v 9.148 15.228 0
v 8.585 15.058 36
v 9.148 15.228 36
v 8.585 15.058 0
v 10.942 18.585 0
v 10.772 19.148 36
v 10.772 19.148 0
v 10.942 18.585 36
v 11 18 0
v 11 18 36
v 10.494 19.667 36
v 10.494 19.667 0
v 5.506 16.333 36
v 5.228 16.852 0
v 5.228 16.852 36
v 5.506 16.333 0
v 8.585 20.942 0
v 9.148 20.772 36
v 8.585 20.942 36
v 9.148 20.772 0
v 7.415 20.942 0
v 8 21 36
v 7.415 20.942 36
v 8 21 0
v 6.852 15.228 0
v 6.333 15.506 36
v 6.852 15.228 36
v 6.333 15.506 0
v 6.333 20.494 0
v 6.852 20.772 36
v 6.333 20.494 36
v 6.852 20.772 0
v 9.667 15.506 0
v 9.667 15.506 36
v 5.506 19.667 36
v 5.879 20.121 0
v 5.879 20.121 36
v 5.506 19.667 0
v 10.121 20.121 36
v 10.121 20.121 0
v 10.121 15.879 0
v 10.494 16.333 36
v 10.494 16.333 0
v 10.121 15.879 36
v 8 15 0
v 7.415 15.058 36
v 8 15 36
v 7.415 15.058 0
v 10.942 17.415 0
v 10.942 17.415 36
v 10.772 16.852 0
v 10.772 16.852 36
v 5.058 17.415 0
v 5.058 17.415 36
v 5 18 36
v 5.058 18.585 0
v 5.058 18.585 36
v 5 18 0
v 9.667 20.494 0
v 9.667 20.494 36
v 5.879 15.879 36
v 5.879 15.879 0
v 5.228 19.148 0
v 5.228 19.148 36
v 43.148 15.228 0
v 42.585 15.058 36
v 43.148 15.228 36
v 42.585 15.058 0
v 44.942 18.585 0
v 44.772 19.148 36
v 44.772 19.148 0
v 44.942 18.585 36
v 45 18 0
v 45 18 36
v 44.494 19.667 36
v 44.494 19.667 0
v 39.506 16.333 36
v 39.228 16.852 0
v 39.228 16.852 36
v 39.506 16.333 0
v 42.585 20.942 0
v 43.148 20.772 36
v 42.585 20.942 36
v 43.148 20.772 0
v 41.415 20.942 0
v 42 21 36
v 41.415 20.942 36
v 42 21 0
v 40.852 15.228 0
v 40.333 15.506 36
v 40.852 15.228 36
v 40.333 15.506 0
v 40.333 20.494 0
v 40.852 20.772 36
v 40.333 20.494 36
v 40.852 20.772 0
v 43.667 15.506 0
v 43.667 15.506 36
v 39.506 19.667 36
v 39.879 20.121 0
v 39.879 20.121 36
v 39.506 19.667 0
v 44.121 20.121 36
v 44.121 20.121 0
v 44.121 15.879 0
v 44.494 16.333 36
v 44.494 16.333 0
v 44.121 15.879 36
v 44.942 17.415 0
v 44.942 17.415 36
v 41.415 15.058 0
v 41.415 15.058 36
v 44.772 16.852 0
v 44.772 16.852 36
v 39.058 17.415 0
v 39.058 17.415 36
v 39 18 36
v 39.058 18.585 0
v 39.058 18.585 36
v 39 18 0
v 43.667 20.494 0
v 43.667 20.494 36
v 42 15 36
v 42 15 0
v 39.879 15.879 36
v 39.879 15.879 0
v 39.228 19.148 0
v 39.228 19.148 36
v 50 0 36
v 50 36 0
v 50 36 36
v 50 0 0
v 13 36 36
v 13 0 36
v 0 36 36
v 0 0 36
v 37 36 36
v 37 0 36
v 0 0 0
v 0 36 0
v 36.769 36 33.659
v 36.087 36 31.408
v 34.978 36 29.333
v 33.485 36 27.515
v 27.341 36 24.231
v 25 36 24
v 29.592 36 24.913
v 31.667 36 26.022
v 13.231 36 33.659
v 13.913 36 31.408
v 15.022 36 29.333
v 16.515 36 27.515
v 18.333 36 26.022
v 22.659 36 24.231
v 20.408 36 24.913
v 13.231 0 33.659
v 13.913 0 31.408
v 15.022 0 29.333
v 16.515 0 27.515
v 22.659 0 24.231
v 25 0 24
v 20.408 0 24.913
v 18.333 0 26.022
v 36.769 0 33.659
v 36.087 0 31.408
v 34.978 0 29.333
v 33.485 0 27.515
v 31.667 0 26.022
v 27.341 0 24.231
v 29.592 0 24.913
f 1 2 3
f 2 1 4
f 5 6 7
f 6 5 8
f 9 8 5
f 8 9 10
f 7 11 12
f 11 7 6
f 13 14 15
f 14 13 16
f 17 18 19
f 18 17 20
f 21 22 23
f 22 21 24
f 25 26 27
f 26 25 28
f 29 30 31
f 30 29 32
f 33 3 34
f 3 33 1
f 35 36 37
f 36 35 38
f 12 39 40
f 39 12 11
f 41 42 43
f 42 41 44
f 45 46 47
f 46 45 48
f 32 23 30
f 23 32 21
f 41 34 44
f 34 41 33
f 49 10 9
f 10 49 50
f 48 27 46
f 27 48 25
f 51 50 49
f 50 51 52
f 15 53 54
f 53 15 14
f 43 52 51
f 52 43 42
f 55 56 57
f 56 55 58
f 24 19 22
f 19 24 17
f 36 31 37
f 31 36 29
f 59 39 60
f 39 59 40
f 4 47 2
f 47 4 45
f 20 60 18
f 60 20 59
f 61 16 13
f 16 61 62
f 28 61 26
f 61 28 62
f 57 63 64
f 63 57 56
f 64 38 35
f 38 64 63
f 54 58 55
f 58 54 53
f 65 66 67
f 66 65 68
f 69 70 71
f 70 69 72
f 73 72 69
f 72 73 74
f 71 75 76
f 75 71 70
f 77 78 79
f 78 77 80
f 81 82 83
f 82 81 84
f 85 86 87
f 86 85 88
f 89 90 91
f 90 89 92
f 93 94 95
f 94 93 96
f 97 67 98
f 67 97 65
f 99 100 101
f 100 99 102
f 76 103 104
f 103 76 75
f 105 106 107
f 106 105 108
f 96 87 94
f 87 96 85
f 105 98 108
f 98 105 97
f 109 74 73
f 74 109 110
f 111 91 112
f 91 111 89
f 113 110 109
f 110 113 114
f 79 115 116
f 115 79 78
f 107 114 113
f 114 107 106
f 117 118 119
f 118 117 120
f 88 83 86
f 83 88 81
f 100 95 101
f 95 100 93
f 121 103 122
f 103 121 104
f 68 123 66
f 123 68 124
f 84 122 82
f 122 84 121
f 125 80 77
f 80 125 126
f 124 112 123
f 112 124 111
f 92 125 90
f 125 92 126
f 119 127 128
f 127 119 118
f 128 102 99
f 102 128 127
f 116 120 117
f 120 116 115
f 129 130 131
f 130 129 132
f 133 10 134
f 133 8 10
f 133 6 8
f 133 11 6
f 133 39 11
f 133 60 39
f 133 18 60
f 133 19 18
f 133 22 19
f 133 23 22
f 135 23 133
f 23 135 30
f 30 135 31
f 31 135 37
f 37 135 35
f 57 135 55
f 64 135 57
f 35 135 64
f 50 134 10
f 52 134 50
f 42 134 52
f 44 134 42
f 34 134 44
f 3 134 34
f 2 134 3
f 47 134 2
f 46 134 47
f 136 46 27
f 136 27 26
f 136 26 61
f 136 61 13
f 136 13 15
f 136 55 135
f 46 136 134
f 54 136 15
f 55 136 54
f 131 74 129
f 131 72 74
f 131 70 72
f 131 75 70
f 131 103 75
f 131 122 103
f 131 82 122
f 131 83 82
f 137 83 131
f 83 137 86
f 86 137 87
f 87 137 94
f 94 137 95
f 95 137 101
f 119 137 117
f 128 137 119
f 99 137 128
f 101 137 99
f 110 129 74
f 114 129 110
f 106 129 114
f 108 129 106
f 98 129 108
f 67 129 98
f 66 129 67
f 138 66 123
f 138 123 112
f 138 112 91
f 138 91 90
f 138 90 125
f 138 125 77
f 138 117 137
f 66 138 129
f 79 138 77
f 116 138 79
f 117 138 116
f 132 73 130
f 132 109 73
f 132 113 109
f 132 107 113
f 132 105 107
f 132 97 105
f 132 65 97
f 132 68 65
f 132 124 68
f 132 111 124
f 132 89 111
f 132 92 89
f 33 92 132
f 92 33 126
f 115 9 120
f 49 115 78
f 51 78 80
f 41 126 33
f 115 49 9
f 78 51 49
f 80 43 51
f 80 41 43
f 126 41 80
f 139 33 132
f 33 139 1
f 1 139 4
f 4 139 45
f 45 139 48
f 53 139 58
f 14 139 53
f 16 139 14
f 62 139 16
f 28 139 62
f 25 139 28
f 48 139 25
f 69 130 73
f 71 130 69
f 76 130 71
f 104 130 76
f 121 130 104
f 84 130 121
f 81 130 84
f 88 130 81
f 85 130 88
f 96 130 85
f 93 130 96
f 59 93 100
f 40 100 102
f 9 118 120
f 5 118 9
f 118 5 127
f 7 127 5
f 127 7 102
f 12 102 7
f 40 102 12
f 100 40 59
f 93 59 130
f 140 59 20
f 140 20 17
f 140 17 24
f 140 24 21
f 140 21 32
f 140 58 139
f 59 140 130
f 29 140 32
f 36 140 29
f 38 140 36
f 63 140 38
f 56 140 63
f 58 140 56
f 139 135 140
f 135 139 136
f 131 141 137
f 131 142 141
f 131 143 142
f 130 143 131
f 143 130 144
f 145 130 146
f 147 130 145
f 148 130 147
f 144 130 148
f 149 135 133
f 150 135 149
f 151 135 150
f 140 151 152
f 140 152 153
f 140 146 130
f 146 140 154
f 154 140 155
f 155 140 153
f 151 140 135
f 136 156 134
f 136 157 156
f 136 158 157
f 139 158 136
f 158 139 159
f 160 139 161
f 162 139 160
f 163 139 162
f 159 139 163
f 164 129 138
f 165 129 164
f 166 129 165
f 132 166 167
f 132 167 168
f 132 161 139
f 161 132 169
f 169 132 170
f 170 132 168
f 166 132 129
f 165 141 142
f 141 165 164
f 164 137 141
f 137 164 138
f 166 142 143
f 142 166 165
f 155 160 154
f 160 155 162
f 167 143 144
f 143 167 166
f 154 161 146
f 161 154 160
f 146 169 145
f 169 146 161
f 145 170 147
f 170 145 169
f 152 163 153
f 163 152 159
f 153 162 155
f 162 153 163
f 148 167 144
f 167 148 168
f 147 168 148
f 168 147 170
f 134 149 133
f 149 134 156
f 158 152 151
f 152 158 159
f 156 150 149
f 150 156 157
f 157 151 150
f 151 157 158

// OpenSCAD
$fn = 32;

// ----------------------------------------------------------------------
// Saddle clamp: plain shaft clamp
// ----------------------------------------------------------------------

// --- parameters (mm) ---
blk_l = 50;               // block length, X
blk_w = 36;               // block width, Y
blk_h = 36;               // block height
clamp_r = 12;             // shaft groove radius
hole_r = 3;               // bolt hole radius
hole_m = 8;               // bolt hole margin from the ends

saw_depth = clamp_r + 3;  // saw kerf depth

difference() {
  cube([blk_l, blk_w, blk_h]);
  translate([blk_l / 2, -1, blk_h])
    rotate([-90, 0, 0])
      cylinder(h = blk_w + 2, r = clamp_r);
  for (sx = [0, 1])
    translate([sx ? blk_l - hole_m : hole_m, blk_w / 2, -1])
      cylinder(r = hole_r, h = blk_h + 2);
}
